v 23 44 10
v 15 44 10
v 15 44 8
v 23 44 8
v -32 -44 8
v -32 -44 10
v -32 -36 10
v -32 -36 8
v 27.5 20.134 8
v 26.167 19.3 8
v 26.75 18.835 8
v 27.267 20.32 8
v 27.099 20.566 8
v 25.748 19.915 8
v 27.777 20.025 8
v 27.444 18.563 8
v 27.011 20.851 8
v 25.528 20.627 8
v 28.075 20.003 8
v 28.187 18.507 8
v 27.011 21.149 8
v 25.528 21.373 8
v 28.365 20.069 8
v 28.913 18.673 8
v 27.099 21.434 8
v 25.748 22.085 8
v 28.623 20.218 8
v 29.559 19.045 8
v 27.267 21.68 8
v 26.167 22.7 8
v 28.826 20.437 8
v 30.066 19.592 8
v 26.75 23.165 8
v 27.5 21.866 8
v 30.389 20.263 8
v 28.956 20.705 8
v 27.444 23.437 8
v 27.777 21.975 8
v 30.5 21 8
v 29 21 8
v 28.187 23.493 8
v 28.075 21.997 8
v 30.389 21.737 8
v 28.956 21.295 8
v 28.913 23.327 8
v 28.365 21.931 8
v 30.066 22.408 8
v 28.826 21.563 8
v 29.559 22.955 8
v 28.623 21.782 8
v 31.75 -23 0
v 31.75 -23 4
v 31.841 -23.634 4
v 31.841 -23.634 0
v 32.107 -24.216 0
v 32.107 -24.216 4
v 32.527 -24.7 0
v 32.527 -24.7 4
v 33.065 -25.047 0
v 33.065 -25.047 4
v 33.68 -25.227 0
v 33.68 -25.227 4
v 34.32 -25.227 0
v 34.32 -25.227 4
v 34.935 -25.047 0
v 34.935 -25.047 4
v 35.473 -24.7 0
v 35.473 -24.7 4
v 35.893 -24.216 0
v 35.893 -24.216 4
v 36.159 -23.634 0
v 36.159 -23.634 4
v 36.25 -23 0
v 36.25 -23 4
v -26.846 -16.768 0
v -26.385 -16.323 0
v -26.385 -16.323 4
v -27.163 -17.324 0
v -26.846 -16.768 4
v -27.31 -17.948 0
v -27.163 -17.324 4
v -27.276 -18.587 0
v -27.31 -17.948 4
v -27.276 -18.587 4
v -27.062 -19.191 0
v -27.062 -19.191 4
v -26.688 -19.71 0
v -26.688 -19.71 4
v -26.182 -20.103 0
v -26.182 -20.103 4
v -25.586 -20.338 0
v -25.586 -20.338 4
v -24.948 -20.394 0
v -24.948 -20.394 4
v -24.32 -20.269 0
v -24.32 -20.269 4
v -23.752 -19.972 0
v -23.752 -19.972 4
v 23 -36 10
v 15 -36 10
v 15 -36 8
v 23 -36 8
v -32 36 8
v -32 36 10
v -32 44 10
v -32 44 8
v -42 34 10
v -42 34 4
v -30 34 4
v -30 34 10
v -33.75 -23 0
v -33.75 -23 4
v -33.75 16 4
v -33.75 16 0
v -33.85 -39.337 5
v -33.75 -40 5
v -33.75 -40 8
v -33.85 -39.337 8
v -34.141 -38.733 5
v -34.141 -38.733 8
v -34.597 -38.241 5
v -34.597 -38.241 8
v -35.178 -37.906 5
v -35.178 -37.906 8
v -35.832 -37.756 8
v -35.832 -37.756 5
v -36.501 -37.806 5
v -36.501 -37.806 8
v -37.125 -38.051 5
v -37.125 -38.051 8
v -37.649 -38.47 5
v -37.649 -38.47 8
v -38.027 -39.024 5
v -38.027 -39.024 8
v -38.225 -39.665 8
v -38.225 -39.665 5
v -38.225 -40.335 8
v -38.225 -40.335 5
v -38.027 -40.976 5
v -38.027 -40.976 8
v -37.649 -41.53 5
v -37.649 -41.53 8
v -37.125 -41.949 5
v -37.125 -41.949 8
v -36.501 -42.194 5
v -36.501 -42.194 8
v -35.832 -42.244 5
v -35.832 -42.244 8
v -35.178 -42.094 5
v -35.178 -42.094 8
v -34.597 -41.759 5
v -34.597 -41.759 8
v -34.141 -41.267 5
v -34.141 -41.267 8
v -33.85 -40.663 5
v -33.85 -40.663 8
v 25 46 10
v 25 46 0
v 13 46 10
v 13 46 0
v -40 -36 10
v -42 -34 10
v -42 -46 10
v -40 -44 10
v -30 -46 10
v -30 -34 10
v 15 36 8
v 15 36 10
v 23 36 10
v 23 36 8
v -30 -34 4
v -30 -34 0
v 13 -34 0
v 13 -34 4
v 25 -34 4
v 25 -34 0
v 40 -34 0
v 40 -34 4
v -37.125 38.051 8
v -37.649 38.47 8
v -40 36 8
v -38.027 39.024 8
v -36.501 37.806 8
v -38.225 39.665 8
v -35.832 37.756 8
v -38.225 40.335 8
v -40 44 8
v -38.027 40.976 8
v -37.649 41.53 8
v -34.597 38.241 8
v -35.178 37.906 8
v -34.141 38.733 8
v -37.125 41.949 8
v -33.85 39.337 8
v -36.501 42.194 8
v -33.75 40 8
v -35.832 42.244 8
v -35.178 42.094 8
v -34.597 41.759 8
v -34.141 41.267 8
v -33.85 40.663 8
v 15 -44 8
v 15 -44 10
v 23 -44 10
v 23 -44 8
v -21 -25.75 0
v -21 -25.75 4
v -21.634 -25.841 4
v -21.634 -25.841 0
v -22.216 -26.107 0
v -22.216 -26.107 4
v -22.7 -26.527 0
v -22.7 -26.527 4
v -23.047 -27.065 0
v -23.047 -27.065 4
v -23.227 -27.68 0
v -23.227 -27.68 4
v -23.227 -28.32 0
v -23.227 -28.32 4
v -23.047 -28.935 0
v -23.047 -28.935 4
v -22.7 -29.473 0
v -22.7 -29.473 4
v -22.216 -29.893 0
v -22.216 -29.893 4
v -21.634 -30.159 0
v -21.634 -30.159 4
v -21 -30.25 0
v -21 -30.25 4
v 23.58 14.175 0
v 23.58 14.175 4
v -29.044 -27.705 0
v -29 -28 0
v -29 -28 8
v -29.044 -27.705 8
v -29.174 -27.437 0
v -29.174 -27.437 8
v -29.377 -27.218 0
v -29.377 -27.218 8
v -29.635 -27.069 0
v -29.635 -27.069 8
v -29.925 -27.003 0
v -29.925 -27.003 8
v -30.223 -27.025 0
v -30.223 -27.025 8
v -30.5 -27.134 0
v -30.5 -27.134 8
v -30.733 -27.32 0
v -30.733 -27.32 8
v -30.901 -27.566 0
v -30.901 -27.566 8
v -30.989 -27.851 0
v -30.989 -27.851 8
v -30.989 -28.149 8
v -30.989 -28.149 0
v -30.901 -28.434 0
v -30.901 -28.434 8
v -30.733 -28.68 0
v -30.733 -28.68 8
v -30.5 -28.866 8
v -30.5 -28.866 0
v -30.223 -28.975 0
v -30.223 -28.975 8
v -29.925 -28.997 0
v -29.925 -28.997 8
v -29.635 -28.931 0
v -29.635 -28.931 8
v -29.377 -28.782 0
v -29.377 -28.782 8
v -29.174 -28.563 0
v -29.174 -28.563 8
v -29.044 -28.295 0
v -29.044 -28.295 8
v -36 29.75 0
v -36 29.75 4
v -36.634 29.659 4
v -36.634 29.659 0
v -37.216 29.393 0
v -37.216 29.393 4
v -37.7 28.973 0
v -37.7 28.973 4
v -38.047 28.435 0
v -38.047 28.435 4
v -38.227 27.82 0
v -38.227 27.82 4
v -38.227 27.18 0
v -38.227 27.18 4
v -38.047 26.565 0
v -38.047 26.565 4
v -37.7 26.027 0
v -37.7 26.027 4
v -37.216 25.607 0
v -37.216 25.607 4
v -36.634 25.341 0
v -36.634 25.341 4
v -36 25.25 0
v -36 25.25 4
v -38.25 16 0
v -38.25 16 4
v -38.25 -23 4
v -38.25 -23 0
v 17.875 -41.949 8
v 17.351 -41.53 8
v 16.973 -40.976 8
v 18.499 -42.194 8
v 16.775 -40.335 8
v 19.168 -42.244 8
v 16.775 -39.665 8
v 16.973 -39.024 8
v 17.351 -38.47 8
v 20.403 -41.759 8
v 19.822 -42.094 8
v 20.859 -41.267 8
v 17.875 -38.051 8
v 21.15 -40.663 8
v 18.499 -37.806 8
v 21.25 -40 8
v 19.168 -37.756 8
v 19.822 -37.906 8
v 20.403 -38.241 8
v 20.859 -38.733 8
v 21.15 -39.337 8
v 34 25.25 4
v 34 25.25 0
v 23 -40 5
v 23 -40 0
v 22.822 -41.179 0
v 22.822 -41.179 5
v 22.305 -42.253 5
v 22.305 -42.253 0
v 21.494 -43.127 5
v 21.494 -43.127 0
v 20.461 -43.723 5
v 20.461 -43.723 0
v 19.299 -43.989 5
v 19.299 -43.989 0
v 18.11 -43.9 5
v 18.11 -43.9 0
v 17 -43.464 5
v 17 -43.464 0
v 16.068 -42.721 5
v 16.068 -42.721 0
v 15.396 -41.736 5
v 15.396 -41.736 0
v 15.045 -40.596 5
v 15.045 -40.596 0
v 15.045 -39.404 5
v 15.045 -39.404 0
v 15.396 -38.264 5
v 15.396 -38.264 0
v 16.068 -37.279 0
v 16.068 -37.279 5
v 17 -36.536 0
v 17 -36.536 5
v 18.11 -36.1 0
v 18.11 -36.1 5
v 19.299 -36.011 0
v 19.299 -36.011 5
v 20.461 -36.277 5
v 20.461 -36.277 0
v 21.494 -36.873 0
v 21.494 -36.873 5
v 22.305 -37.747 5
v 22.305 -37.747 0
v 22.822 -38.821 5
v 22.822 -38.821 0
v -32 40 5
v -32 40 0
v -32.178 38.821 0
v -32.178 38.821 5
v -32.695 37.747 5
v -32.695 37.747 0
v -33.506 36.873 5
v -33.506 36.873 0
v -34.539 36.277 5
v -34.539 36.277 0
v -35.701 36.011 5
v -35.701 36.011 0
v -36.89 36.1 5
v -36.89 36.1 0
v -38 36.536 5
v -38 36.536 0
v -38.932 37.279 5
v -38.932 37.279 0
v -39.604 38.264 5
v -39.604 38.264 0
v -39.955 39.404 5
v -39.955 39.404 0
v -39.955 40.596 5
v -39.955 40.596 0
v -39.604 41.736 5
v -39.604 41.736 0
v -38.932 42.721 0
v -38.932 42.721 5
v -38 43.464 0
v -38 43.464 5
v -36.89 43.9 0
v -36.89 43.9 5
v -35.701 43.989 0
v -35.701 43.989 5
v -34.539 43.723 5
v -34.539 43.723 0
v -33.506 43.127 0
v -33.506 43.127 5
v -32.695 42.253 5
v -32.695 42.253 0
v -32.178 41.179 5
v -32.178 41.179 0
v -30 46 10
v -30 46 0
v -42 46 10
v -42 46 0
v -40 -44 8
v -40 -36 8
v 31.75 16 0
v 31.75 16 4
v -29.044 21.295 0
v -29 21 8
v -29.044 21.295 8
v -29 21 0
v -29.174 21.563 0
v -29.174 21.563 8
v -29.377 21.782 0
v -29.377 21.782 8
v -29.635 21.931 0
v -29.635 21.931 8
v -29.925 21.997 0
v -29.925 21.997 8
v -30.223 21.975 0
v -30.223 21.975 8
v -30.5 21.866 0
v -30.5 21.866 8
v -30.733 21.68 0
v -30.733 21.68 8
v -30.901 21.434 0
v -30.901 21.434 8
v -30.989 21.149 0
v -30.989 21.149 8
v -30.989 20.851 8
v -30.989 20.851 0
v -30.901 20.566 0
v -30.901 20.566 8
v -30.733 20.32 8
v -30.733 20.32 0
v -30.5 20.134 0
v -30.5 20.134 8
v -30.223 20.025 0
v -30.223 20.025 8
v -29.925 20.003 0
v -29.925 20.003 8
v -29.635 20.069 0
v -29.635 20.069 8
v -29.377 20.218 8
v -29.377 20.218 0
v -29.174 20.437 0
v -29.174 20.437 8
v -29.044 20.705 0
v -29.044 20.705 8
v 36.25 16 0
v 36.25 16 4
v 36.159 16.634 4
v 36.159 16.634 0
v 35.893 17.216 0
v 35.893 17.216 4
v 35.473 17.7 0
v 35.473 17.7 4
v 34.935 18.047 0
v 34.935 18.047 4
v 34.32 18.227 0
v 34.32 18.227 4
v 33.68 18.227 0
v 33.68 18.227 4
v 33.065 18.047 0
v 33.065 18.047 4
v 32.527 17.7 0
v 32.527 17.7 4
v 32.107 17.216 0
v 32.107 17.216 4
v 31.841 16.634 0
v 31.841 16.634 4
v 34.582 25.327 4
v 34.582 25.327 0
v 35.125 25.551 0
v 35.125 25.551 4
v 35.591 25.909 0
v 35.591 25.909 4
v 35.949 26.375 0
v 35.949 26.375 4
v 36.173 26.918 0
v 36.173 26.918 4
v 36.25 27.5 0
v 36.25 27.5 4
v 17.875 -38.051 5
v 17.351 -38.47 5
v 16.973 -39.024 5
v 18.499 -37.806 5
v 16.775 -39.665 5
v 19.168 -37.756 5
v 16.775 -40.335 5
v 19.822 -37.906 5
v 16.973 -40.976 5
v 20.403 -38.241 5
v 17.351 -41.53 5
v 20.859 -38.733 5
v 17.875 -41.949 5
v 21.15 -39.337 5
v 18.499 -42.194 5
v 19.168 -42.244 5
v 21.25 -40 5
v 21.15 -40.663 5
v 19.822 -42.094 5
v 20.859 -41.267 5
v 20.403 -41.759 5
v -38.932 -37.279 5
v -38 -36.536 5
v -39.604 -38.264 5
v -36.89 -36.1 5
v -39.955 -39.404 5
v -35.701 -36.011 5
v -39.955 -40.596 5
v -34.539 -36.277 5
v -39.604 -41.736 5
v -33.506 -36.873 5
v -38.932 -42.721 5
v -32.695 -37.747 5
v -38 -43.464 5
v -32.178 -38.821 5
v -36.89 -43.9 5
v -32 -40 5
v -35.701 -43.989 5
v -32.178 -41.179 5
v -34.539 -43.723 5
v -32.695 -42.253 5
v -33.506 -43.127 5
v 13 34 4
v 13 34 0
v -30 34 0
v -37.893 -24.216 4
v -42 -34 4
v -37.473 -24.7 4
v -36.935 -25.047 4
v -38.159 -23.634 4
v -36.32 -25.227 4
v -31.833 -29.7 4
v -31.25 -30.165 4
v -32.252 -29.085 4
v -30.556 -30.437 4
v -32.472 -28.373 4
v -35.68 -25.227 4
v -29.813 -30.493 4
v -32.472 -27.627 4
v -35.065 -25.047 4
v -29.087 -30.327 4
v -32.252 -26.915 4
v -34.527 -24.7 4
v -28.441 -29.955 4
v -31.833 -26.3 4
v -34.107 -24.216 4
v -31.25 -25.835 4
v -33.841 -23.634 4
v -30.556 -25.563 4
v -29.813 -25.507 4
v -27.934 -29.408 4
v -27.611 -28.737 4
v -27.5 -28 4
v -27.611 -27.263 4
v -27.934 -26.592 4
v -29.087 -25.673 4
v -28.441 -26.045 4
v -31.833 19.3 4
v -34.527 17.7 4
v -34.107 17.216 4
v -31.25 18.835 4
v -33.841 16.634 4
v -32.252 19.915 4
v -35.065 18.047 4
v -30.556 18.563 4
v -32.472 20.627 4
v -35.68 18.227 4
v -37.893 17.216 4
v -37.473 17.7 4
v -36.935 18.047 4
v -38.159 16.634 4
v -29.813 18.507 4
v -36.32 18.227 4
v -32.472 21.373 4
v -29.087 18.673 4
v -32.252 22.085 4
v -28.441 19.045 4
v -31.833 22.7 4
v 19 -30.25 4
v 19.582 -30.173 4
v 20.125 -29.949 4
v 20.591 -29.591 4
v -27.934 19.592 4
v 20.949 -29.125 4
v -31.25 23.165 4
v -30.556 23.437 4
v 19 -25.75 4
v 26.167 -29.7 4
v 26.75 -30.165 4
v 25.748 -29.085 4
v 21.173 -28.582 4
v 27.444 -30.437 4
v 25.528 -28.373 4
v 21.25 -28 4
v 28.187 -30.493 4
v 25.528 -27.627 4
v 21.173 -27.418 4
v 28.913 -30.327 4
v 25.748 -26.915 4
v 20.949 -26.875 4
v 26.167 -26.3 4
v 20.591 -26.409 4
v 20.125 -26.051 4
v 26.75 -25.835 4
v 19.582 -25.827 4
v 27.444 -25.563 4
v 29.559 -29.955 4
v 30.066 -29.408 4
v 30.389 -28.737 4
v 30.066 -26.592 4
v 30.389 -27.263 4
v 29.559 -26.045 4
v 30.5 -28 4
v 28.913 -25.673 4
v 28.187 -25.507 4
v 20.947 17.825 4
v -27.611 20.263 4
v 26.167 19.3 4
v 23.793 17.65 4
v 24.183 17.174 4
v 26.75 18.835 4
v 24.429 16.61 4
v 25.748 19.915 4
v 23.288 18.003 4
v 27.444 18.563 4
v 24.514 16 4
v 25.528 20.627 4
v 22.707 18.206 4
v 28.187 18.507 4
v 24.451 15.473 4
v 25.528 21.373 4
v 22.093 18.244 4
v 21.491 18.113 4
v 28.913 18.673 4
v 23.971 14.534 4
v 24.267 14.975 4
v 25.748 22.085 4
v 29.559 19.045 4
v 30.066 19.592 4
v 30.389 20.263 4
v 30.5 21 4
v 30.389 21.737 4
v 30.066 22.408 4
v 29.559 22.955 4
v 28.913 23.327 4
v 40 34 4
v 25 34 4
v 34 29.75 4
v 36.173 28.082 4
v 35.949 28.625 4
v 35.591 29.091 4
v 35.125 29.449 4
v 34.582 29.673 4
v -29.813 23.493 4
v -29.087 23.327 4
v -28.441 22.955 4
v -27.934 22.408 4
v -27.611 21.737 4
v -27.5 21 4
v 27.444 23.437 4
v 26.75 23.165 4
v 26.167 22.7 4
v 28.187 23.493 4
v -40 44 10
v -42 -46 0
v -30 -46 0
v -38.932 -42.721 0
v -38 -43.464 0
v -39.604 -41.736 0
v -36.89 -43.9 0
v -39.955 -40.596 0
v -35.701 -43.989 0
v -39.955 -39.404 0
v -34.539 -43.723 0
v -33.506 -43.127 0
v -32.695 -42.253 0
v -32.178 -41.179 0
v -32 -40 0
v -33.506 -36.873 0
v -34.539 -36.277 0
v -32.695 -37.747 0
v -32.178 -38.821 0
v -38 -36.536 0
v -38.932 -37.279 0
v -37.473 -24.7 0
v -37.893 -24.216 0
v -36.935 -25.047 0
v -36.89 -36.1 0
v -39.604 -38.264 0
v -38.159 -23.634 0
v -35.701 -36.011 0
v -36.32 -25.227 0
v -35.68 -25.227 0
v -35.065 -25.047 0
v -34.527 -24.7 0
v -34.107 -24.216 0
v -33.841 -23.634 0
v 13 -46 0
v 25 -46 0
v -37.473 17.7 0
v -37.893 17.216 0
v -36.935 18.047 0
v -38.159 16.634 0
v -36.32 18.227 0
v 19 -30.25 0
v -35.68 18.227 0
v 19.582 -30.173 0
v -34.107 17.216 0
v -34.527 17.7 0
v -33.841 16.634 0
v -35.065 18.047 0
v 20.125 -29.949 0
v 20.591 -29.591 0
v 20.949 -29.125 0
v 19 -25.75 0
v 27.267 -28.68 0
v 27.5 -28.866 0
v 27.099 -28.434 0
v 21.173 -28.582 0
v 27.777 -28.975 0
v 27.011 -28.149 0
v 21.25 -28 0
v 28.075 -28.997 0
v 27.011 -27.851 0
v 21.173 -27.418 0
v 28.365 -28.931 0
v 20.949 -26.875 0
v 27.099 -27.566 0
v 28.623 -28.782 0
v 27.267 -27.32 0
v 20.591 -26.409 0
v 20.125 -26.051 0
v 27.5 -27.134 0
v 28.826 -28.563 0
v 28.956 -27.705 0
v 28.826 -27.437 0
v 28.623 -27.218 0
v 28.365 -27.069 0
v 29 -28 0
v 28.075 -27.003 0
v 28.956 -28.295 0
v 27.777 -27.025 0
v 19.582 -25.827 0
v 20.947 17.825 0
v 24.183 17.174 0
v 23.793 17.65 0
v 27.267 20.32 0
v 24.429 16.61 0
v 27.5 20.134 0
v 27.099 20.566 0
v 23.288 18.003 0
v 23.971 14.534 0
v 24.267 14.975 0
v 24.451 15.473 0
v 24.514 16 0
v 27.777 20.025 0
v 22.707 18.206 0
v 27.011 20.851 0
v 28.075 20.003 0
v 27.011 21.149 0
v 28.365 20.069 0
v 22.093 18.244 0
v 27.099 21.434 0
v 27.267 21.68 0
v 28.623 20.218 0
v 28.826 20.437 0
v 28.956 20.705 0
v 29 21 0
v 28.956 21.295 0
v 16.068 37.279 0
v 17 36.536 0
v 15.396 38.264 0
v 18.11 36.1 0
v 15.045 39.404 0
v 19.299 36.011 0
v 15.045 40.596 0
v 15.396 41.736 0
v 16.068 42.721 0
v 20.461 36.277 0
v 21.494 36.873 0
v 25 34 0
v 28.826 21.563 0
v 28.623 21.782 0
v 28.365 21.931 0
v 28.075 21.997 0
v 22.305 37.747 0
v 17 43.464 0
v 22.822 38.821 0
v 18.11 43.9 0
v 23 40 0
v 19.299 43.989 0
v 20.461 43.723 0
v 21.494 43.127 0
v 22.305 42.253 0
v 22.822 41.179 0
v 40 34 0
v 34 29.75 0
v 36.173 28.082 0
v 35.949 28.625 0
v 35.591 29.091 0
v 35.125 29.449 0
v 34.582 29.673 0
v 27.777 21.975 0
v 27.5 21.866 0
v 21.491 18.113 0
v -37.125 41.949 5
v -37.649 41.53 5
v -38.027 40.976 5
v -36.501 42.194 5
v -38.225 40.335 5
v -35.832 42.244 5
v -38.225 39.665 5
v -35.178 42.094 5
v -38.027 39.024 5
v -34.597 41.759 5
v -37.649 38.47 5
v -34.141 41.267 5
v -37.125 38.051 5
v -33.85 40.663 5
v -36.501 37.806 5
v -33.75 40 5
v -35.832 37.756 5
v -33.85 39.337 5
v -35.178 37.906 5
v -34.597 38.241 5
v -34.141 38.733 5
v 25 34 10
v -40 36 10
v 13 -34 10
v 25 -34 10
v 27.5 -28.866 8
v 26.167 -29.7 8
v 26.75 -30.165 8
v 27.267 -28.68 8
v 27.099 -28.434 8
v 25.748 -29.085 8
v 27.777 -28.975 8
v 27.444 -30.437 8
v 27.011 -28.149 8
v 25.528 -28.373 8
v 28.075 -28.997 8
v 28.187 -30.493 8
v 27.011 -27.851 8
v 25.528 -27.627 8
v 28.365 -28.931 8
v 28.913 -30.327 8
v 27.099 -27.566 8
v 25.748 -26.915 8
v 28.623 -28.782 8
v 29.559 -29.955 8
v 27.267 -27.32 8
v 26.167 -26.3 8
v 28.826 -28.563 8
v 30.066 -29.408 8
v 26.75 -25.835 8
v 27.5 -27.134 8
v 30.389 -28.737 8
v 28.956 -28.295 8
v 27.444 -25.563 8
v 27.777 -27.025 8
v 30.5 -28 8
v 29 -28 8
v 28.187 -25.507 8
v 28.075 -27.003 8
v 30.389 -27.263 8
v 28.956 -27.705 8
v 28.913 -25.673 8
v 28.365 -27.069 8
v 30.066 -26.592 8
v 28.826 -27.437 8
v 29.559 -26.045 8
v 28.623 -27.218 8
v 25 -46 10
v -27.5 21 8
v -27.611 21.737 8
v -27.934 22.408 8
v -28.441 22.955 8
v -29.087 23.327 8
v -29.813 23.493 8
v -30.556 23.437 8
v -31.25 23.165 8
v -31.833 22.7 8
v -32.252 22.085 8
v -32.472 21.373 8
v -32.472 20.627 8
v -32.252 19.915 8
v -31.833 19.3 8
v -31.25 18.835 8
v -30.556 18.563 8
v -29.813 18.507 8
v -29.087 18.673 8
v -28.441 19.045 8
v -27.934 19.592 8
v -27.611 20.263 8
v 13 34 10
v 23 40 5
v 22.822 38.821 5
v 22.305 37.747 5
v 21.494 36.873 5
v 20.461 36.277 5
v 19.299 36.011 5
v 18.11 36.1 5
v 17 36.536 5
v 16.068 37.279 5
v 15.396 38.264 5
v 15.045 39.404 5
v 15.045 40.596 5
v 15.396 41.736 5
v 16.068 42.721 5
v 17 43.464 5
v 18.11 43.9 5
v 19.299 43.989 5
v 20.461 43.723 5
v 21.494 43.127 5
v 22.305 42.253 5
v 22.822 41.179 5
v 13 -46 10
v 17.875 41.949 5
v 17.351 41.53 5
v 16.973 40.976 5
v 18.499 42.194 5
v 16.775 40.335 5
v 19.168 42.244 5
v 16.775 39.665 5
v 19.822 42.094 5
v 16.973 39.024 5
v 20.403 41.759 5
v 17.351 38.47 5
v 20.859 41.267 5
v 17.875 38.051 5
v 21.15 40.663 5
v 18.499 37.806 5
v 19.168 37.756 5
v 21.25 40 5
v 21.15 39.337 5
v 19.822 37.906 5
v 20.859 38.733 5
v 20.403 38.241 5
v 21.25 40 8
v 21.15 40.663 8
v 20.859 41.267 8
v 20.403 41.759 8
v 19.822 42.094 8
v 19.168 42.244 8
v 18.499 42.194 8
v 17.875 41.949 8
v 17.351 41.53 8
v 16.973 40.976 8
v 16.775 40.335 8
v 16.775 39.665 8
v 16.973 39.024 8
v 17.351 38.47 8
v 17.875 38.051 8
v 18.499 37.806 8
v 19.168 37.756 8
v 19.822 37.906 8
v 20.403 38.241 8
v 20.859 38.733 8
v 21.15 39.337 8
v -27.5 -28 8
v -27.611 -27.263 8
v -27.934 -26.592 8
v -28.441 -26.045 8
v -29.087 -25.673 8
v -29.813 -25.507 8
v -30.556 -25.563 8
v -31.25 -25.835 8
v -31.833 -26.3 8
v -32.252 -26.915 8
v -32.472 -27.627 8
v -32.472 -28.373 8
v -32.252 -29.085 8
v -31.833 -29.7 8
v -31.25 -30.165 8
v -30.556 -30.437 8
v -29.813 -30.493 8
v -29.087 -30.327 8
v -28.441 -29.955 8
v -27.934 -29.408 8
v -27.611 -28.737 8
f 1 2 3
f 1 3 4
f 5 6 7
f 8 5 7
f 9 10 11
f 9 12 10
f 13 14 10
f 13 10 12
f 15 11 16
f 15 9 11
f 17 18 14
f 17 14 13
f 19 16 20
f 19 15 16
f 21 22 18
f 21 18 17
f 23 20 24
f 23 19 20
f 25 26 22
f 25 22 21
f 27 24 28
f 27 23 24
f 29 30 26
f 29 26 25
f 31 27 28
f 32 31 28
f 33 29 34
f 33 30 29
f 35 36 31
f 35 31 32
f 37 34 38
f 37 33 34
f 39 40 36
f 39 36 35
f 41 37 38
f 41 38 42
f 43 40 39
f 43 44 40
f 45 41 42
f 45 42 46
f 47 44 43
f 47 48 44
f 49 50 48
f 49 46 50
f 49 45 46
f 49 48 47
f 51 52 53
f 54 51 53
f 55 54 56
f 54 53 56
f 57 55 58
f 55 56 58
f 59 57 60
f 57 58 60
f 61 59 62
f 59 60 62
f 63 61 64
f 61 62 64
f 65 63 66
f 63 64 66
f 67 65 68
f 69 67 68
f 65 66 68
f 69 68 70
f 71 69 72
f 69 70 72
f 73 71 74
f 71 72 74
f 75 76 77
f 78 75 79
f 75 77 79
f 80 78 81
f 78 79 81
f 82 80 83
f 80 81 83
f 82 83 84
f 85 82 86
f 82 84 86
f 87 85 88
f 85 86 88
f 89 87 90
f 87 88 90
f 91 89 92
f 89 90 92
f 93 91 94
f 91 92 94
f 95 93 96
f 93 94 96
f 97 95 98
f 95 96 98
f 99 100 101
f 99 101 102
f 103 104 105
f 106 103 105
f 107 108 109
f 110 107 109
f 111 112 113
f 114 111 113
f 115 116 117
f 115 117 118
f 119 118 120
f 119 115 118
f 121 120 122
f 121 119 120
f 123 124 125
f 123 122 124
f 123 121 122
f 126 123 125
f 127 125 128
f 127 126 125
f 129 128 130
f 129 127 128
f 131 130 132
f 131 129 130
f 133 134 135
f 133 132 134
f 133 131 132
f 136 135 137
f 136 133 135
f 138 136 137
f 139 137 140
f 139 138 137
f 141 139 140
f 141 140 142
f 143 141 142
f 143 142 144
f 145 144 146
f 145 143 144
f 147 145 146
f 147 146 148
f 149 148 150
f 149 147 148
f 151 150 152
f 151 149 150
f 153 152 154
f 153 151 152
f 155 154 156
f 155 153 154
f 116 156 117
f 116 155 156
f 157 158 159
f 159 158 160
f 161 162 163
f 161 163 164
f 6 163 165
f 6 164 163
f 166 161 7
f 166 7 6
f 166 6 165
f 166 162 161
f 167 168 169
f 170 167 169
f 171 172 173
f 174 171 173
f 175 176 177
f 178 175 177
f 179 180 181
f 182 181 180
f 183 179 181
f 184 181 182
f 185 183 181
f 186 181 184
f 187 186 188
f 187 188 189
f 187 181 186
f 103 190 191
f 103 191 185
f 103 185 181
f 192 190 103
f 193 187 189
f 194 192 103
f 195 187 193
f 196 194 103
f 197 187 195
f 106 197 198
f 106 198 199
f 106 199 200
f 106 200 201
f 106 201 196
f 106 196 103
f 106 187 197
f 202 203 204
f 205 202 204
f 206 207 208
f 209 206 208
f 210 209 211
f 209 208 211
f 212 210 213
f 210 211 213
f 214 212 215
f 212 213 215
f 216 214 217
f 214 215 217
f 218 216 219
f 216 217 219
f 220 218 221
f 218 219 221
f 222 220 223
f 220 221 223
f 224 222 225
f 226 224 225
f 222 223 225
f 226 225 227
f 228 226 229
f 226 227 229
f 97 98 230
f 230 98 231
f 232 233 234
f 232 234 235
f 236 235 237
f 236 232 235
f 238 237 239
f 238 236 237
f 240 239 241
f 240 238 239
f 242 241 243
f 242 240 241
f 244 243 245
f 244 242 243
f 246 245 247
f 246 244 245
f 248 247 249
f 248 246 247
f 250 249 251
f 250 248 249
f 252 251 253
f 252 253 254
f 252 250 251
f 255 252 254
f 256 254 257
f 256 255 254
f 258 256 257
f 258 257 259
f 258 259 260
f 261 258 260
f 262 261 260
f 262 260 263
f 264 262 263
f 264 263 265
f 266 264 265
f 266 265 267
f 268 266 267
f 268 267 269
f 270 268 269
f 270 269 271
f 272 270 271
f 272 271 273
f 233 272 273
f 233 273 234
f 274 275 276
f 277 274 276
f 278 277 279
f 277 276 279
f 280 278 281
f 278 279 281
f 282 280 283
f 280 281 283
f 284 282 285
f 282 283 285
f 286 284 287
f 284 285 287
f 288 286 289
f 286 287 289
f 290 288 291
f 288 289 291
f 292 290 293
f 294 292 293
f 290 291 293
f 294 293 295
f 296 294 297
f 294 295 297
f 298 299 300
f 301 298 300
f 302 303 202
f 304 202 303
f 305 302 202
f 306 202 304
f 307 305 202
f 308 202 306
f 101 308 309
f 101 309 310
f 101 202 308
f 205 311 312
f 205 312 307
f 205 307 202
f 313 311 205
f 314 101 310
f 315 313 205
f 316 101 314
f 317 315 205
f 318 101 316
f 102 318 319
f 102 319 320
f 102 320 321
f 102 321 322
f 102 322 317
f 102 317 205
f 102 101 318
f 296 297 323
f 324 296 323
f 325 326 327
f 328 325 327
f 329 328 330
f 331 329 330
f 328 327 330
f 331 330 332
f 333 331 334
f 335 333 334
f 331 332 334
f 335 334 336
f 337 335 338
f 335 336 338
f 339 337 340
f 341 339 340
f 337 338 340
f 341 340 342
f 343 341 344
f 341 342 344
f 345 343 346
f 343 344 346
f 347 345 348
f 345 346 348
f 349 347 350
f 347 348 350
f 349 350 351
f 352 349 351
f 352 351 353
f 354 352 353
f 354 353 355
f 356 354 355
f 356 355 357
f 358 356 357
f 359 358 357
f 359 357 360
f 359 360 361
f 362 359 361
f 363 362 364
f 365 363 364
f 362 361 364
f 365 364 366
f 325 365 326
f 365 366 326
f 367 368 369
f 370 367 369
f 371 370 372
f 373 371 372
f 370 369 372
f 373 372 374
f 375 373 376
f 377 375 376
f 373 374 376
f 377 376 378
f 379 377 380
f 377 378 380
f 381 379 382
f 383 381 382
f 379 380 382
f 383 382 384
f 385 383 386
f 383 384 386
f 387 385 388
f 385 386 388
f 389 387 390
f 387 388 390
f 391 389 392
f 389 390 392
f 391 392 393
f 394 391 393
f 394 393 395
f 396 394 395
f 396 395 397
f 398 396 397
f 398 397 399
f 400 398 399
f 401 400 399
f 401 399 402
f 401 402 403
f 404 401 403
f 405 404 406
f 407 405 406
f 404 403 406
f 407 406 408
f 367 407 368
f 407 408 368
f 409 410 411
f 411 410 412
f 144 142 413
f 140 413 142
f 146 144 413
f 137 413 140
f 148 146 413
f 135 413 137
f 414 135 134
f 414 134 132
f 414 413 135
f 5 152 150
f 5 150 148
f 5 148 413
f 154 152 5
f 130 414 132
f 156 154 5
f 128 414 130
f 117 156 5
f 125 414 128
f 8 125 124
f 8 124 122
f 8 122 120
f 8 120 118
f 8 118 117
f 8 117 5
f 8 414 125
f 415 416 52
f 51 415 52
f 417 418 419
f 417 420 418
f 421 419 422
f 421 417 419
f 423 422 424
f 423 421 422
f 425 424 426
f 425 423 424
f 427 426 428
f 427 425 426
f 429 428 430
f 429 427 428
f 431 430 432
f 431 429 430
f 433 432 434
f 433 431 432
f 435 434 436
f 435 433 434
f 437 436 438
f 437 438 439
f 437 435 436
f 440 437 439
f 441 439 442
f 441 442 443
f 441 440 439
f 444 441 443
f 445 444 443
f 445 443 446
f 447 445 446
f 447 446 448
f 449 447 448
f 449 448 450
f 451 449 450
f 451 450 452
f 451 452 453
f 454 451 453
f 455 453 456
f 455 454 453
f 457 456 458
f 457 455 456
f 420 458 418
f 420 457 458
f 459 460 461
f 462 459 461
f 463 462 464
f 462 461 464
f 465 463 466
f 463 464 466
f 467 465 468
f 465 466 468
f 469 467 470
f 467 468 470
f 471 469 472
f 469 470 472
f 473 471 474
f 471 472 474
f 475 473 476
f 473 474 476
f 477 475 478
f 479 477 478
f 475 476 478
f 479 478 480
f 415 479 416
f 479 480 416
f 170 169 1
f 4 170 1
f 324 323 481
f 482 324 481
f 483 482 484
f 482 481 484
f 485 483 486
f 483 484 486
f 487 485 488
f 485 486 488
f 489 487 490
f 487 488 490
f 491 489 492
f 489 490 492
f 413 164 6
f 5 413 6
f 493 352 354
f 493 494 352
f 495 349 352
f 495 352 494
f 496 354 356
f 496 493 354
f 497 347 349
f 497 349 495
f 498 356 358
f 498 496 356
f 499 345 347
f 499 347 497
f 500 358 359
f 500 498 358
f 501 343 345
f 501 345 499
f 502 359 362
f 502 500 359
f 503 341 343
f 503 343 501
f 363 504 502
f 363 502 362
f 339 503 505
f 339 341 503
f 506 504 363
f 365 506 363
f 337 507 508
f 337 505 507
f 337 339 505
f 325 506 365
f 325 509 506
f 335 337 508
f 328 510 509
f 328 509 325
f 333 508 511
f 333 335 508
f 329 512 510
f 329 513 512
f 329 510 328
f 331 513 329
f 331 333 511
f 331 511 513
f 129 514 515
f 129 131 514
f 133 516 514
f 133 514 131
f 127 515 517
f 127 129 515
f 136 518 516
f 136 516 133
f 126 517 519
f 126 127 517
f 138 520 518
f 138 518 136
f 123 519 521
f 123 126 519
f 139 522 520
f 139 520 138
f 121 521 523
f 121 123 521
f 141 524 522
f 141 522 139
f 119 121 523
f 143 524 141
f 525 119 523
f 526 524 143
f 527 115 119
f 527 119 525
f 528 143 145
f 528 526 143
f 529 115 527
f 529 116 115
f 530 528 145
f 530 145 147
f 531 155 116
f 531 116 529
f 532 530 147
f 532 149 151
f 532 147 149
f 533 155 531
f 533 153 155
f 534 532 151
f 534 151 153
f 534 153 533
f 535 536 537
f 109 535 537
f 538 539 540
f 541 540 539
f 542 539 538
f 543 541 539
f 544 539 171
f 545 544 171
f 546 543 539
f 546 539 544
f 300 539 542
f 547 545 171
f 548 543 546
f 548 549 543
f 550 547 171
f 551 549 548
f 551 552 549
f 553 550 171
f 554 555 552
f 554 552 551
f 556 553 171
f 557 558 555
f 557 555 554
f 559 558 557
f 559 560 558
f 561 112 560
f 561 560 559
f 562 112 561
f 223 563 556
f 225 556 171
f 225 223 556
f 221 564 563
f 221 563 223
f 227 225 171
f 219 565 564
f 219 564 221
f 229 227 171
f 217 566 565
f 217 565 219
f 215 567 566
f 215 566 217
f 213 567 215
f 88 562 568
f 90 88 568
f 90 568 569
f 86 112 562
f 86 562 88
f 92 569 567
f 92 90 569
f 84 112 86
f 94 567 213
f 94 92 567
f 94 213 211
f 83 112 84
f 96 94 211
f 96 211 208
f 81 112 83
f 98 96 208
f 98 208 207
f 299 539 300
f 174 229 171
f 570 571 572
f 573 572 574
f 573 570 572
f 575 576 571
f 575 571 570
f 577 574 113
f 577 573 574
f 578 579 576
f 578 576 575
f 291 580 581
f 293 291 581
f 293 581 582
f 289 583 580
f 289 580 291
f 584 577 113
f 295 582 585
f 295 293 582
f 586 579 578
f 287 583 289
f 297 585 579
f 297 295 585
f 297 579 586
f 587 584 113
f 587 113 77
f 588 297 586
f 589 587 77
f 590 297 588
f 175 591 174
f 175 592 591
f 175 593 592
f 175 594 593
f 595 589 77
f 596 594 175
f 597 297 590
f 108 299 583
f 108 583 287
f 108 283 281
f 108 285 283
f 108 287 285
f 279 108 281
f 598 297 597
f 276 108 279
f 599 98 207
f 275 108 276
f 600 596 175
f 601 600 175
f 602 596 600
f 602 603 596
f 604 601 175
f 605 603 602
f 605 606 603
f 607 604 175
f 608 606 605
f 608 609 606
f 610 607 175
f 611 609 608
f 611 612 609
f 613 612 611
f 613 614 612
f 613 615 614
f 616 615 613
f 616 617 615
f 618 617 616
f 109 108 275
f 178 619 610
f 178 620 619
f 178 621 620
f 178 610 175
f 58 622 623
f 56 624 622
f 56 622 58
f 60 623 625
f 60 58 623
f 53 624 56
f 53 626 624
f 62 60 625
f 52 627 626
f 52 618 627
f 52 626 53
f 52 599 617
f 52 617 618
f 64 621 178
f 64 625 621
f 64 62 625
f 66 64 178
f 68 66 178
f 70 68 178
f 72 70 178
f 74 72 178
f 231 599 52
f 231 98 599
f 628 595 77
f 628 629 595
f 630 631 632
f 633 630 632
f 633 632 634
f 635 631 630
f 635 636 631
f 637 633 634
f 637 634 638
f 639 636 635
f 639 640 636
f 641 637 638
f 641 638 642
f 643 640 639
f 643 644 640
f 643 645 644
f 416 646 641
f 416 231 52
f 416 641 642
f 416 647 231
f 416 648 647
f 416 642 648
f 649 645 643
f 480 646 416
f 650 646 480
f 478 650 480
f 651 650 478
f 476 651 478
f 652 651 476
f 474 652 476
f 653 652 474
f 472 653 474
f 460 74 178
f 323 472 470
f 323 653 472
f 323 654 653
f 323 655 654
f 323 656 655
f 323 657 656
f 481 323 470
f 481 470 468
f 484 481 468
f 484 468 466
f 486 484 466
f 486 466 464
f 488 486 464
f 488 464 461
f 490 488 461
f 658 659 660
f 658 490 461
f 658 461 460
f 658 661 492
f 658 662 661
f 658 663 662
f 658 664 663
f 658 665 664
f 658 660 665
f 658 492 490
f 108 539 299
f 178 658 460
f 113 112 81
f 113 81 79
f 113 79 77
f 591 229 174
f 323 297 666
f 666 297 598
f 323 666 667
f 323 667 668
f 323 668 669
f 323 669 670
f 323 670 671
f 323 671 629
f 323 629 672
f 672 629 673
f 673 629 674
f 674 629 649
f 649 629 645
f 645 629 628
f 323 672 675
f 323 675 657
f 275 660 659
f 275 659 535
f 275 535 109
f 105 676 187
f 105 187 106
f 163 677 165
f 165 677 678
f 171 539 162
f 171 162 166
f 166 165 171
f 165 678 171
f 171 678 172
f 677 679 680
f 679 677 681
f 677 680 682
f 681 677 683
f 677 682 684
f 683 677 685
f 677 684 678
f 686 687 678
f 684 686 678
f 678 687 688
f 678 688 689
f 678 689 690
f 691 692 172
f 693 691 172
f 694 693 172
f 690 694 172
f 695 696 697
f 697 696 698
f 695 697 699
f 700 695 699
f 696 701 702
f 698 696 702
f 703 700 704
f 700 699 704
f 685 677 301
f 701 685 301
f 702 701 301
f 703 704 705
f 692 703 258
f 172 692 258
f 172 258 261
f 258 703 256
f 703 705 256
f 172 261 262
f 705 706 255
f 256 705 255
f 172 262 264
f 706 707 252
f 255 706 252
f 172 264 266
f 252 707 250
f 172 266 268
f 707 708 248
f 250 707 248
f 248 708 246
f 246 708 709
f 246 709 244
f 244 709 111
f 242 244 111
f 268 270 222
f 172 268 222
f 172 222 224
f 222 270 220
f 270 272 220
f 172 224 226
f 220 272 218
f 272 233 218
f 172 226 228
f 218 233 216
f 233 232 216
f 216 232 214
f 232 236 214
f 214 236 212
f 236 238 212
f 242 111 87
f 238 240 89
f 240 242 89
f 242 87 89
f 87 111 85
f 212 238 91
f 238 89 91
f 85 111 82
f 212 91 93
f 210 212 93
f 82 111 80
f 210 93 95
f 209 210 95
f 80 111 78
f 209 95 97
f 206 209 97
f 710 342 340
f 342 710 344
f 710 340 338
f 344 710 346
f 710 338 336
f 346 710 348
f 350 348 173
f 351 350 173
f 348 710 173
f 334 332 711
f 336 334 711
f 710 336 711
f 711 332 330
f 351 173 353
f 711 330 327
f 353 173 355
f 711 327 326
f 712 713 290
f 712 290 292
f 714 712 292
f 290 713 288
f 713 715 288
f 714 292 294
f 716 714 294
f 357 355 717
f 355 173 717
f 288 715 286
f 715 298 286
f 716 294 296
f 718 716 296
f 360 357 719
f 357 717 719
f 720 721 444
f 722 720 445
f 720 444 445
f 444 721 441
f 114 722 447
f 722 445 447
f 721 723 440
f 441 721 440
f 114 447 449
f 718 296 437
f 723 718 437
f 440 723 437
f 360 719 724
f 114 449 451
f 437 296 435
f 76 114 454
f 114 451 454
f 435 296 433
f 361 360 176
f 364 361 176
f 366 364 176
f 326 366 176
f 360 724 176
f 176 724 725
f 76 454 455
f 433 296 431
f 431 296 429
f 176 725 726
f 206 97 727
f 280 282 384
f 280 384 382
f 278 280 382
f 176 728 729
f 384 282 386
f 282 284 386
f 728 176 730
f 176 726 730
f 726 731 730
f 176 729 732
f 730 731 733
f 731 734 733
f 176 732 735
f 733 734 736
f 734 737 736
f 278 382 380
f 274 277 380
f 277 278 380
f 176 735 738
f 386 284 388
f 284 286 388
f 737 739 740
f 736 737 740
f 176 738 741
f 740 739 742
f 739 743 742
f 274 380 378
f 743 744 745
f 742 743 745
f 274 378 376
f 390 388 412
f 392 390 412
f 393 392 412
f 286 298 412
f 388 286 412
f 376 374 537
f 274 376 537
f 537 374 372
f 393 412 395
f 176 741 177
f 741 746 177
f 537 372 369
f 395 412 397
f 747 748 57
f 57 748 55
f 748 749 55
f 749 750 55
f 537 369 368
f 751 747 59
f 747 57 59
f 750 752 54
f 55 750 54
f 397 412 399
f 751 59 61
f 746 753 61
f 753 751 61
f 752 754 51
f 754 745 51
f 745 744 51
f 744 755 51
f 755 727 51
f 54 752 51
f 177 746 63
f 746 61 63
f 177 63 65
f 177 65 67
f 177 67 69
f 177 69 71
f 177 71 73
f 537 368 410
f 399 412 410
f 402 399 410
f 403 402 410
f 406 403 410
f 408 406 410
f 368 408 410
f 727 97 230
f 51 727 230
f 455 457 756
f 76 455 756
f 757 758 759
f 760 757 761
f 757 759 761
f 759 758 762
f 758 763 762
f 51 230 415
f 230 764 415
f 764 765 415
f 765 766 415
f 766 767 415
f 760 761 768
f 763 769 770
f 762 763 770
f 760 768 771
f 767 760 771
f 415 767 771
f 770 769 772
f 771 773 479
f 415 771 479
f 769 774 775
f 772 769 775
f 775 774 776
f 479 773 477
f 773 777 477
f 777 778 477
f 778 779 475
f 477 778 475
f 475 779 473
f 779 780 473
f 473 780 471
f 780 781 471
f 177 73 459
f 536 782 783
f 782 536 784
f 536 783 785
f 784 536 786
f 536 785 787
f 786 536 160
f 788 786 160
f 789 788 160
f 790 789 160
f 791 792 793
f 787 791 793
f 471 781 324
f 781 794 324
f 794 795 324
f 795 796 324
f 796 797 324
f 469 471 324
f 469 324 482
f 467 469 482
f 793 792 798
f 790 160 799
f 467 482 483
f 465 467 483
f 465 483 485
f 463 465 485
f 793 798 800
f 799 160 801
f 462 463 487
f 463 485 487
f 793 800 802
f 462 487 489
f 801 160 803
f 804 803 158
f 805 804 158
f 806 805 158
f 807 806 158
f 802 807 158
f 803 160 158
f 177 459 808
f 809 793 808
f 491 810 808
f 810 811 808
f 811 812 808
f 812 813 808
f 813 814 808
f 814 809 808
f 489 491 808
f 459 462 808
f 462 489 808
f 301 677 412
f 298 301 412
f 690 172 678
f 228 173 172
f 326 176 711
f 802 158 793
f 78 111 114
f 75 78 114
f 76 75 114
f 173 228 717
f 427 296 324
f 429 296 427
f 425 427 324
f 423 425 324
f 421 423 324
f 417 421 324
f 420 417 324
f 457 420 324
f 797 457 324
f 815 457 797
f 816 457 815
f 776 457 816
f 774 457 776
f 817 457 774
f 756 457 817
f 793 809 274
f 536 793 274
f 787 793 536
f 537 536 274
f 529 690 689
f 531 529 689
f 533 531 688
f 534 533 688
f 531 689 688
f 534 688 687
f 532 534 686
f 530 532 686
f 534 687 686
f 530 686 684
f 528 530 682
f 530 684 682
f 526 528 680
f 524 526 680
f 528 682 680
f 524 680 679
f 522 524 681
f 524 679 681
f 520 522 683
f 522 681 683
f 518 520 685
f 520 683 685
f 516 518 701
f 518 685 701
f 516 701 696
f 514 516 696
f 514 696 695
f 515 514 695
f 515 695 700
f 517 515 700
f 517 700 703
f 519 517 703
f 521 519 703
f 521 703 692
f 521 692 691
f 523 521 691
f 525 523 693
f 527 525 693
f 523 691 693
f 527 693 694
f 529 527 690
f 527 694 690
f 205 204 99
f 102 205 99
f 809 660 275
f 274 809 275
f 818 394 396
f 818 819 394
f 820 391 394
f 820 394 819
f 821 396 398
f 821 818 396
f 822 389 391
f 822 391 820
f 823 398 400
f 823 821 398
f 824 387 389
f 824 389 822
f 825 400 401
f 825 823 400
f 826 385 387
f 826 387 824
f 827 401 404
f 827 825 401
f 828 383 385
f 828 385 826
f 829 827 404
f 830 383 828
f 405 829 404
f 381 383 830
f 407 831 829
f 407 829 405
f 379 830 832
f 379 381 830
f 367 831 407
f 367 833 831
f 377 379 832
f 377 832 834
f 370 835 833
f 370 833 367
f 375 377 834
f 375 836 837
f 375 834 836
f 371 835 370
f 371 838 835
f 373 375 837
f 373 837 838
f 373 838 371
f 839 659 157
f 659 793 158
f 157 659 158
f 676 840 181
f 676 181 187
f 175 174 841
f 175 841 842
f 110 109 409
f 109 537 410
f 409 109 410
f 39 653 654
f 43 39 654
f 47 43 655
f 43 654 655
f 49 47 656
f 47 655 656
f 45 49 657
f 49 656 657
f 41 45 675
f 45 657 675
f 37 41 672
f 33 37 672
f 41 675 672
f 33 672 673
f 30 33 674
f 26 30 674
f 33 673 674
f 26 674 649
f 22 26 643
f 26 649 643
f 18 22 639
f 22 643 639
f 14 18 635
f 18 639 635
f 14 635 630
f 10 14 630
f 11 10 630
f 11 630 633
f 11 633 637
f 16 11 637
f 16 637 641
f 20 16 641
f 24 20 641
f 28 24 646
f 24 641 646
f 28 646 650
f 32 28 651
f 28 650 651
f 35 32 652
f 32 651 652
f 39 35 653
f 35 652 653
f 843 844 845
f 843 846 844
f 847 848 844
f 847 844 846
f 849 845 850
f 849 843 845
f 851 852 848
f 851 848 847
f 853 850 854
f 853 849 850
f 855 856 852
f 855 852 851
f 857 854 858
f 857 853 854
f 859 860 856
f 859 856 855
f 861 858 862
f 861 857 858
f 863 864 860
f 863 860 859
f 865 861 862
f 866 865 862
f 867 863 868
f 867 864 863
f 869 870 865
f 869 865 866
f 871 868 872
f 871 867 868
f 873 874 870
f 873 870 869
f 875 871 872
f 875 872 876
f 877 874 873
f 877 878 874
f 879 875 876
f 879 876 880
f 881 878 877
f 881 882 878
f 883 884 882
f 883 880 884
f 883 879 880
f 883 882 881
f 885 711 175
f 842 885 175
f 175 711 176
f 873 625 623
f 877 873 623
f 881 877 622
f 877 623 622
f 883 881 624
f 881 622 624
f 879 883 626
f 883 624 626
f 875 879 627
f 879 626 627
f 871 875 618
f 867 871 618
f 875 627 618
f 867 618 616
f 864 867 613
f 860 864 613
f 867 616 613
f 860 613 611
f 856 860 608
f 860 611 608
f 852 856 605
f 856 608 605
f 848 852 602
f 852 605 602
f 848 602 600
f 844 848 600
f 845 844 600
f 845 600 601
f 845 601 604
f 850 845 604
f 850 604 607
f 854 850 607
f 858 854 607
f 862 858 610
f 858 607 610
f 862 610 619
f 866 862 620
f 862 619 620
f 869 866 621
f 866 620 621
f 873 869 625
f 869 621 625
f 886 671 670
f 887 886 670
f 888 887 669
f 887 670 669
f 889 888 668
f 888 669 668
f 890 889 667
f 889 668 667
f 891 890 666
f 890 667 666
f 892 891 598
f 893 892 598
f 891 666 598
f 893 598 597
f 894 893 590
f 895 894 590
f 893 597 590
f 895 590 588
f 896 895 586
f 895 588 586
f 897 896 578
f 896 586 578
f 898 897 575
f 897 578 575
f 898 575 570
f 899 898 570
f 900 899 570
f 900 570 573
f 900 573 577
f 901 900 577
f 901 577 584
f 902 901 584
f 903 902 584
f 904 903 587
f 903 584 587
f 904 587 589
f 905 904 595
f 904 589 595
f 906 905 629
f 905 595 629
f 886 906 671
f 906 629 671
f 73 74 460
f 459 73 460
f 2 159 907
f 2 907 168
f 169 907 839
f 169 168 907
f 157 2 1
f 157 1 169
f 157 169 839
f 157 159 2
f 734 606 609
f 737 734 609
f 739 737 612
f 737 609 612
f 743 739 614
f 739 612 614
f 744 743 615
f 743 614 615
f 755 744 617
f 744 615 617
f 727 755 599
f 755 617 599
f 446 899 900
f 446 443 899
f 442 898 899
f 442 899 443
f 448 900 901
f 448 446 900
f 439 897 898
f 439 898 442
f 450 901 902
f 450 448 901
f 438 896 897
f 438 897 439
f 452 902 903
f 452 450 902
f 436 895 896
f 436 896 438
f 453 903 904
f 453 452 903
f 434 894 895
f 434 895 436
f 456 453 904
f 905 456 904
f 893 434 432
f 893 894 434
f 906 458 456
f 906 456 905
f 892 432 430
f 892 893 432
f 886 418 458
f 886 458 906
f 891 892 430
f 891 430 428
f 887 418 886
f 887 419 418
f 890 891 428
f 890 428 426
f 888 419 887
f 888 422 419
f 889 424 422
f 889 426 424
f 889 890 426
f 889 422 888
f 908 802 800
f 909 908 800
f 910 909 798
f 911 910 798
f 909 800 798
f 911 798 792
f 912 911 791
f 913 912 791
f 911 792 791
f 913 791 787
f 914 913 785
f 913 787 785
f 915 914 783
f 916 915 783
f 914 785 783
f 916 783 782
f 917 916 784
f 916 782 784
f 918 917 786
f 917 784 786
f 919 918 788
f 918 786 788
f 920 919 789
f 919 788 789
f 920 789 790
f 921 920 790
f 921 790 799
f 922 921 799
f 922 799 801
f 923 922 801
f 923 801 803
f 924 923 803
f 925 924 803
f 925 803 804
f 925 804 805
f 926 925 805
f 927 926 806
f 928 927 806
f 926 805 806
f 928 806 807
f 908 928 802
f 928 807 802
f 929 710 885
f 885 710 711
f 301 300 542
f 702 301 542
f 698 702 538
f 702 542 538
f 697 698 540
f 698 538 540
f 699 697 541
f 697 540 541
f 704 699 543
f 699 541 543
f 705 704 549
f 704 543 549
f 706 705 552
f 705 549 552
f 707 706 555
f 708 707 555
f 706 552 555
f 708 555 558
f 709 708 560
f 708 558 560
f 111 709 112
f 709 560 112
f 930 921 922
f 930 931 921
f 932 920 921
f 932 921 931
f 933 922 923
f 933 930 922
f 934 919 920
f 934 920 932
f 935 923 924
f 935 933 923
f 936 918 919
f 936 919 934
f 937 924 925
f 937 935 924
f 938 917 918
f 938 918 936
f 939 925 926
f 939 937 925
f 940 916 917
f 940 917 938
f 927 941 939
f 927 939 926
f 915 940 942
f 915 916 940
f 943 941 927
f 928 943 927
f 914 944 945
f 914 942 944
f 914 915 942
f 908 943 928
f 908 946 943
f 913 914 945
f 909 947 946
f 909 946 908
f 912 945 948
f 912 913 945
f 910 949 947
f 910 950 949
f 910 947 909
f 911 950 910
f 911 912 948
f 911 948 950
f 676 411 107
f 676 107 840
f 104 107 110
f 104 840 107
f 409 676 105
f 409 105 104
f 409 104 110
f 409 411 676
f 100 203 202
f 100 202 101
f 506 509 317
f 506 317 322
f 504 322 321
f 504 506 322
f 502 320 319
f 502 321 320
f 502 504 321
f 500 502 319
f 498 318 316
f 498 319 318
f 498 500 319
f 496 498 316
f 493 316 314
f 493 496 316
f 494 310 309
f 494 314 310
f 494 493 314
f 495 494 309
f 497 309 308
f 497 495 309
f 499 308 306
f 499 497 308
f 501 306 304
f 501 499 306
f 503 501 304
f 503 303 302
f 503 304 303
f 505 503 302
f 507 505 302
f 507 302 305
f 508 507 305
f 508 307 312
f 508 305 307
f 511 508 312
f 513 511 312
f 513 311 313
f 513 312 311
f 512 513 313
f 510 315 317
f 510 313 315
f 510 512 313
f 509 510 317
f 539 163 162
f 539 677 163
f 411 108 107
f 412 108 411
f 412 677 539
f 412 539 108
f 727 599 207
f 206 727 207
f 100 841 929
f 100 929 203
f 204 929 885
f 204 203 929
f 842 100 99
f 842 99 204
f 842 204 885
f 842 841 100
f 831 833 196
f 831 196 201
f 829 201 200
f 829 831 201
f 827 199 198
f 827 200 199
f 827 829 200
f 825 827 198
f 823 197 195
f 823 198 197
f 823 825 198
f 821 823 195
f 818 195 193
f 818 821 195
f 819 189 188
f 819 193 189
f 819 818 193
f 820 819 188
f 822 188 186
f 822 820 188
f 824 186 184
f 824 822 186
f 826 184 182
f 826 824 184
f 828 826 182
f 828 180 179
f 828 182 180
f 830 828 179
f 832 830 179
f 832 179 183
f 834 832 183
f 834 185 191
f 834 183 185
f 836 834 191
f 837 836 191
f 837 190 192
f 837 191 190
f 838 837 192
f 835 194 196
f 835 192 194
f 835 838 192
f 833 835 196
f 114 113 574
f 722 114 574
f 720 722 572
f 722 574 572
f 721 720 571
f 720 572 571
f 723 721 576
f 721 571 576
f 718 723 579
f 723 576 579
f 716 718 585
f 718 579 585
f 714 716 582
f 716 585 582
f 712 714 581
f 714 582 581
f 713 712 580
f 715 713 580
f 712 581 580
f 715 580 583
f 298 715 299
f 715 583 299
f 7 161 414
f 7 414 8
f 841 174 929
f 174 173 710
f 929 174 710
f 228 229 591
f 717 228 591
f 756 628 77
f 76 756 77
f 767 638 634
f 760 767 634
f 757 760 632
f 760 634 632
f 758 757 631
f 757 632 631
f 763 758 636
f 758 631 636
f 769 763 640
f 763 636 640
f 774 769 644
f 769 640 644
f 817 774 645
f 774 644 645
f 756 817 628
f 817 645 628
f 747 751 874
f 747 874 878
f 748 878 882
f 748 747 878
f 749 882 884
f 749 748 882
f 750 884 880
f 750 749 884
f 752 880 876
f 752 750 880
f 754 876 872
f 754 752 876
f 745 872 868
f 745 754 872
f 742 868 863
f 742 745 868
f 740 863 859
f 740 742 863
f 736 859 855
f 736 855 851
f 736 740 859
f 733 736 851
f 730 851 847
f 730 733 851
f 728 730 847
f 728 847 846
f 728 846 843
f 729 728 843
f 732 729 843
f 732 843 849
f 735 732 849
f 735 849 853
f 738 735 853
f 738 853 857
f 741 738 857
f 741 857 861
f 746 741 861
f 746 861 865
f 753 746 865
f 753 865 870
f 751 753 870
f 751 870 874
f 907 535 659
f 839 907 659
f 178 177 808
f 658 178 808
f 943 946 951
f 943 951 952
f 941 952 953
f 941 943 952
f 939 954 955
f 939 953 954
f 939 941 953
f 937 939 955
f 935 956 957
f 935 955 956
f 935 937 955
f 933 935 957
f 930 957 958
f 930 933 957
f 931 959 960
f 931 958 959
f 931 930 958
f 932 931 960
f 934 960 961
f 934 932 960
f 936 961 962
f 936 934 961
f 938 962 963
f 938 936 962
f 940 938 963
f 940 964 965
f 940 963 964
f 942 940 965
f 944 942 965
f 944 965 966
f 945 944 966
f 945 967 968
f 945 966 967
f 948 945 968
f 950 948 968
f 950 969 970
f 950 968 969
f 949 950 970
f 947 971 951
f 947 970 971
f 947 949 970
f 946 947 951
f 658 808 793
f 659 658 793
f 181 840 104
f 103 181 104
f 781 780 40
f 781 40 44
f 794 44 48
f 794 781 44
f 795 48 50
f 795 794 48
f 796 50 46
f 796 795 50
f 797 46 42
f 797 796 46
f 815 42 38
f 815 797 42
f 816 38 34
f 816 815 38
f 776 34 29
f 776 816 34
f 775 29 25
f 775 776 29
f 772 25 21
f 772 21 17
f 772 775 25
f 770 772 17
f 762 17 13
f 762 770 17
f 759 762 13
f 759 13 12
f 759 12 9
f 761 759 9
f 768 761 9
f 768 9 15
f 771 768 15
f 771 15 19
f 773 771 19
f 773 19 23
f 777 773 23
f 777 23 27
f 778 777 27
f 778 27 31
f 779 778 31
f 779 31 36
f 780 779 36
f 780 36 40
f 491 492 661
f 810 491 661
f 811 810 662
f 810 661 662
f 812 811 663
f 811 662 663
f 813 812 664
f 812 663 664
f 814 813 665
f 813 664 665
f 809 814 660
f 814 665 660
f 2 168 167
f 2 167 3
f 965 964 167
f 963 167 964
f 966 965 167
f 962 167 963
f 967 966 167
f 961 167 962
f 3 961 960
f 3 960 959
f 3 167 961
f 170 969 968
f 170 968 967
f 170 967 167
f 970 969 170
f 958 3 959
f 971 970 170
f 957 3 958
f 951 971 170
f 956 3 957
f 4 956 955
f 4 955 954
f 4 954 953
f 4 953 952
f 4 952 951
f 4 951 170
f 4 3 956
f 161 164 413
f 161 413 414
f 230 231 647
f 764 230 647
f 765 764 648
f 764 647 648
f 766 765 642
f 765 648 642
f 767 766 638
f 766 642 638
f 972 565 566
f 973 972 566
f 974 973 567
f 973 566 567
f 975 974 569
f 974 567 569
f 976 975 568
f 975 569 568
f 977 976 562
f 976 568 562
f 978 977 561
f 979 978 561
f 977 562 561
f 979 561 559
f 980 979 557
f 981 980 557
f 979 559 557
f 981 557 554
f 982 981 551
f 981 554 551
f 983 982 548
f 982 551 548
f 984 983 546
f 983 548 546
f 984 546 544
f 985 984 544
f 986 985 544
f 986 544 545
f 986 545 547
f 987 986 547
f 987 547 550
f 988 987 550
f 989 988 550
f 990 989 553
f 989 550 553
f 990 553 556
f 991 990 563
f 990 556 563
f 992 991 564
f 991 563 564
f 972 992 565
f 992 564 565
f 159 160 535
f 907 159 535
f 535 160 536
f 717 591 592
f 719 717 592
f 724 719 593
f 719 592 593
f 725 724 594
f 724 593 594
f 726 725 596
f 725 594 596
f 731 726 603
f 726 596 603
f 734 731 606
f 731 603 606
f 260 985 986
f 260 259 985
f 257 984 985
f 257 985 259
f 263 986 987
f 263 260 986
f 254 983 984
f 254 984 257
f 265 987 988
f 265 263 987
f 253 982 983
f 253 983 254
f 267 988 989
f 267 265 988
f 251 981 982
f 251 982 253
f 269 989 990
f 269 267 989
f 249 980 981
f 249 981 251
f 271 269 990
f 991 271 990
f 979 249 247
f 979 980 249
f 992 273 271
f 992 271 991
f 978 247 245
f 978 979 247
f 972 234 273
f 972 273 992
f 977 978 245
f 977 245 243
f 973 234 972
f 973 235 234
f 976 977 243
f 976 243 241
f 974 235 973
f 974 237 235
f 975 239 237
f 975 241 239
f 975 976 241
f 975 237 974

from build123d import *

# Parameters (mm, degrees)
F0_R      = 2.25
F0_R_2    = 1
F1_DEPTH  = 4
F2_W      = 12
F2_H      = 12
F2_R      = 2.25
F3_DEPTH  = 6
F4_W      = 8
F4_H      = 8
F5_DEPTH  = 2
F6_R      = 4
F6_R_2    = 2.25
F7_DEPTH  = 5
F8_R      = 2.5
F8_R_2    = 1
F9_DEPTH  = 4
F11_DEPTH = 4.001


with BuildPart() as f1:
    # F0 (on Top) → F1 (new body)
    with BuildSketch(Plane.XY):
        Polygon((-30, 46), (-42, 46), (-42, -46), (-30, -46), (-30, -34), (13, -34), (13, -46), (25, -46), (25, -34), (40, -34), (40, 34), (25, 34), (25, 46), (13, 46), (13, 34), (-30, 34), align=None)
        with Locations((-36, -40)):
            Circle(F0_R, mode=Mode.SUBTRACT)
        with Locations((-30, -28)):
            Circle(F0_R_2, mode=Mode.SUBTRACT)
        with Locations((19, -40)):
            Circle(F0_R, mode=Mode.SUBTRACT)
        with Locations((28, -28)):
            Circle(F0_R_2, mode=Mode.SUBTRACT)
        with Locations((-30, 21)):
            Circle(F0_R_2, mode=Mode.SUBTRACT)
        with Locations((-36, 40)):
            Circle(F0_R, mode=Mode.SUBTRACT)
        with Locations((28, 21)):
            Circle(F0_R_2, mode=Mode.SUBTRACT)
        with Locations((19, 40)):
            Circle(F0_R, mode=Mode.SUBTRACT)
    extrude(amount=F1_DEPTH)

    # F2 (on face) → F3 (join)
    with BuildSketch(Plane.XY.offset(4)):
        with Locations((-36, -40)):
            Rectangle(F2_W, F2_H)
        with Locations((-36, -40)):
            Circle(F2_R, mode=Mode.SUBTRACT)
        with Locations((-36, 40)):
            Rectangle(F2_W, F2_H)
        with Locations((-36, 40)):
            Circle(F2_R, mode=Mode.SUBTRACT)
        with Locations((19, 40)):
            Rectangle(F2_W, F2_H)
        with Locations((19, 40)):
            Circle(F2_R, mode=Mode.SUBTRACT)
        with Locations((19, -40)):
            Rectangle(F2_W, F2_H)
        with Locations((19, -40)):
            Circle(F2_R, mode=Mode.SUBTRACT)
    extrude(amount=F3_DEPTH)

    # F4 (on face) → F5 (cut)
    with BuildSketch(Plane.XY.offset(10)):
        with Locations((-36, 40)):
            Rectangle(F4_W, F4_H)
        with Locations((19, 40)):
            Rectangle(F4_W, F4_H)
        with Locations((19, -40)):
            Rectangle(F4_W, F4_H)
        with Locations((-36, -40)):
            Rectangle(F4_W, F4_H)
    extrude(amount=-F5_DEPTH, mode=Mode.SUBTRACT)

    # F6 (on face) → F7 (cut)
    with BuildSketch(Plane(origin=(0, 0, 0), x_dir=(1, 0, 0), z_dir=(0, 0, -1))):
        with Locations((-36, 40)):
            Circle(F6_R)
        with Locations((-36, 40)):
            Circle(F6_R_2, mode=Mode.SUBTRACT)
        with Locations((19, 40)):
            Circle(F6_R)
        with Locations((19, 40)):
            Circle(F6_R_2, mode=Mode.SUBTRACT)
        with Locations((19, -40)):
            Circle(F6_R)
        with Locations((19, -40)):
            Circle(F6_R_2, mode=Mode.SUBTRACT)
        with Locations((-36, -40)):
            Circle(F6_R)
        with Locations((-36, -40)):
            Circle(F6_R_2, mode=Mode.SUBTRACT)
    extrude(amount=-F7_DEPTH, mode=Mode.SUBTRACT)

    # F8 (on face) → F9 (join)
    with BuildSketch(Plane.XY.offset(4)):
        with Locations((-30, 21)):
            Circle(F8_R)
        with Locations((-30, 21)):
            Circle(F8_R_2, mode=Mode.SUBTRACT)
        with Locations((-30, -28)):
            Circle(F8_R)
        with Locations((-30, -28)):
            Circle(F8_R_2, mode=Mode.SUBTRACT)
        with Locations((28, -28)):
            Circle(F8_R)
        with Locations((28, -28)):
            Circle(F8_R_2, mode=Mode.SUBTRACT)
        with Locations((28, 21)):
            Circle(F8_R)
        with Locations((28, 21)):
            Circle(F8_R_2, mode=Mode.SUBTRACT)
    extrude(amount=F9_DEPTH)

    # F10 (on face) → F11 (cut, through all)
    with BuildSketch(Plane.XY.offset(4)):
        with BuildLine():
            ThreePointArc((-36, 29.75), (-34.40901, 29.09099), (-33.75, 27.5))
            ThreePointArc((-33.75, 27.5), (-34.40901, 25.90901), (-36, 25.25))
            Line((-36, 25.25), (34, 25.25))
            ThreePointArc((34, 25.25), (31.75, 27.5), (34, 29.75))
            Line((34, 29.75), (-36, 29.75))
        make_face()
        with BuildLine():
            ThreePointArc((-36, 25.25), (-34.40901, 25.90901), (-33.75, 27.5))
            ThreePointArc((-33.75, 27.5), (-34.40901, 29.09099), (-36, 29.75))
            ThreePointArc((-36, 29.75), (-38.25, 27.5), (-36, 25.25))
        make_face()
        with BuildLine():
            ThreePointArc((-38.25, 16), (-36, 13.75), (-33.75, 16))
            ThreePointArc((-33.75, 16), (-36, 18.25), (-38.25, 16))
        make_face()
        with BuildLine():
            Line((-33.75, -23), (-33.75, 16))
            ThreePointArc((-33.75, 16), (-36, 13.75), (-38.25, 16))
            Line((-38.25, 16), (-38.25, -23))
            ThreePointArc((-38.25, -23), (-36, -20.75), (-33.75, -23))
        make_face()
        with BuildLine():
            ThreePointArc((-38.25, -23), (-36, -25.25), (-33.75, -23))
            ThreePointArc((-33.75, -23), (-36, -20.75), (-38.25, -23))
        make_face()
        with BuildLine():
            ThreePointArc((-23.752473, -19.972448), (-23.06584, -19.172576), (-22.818894, -18.147746))
            ThreePointArc((-22.818894, -18.147746), (-24.044064, -16.144693), (-26.385315, -16.323045))
            ThreePointArc((-26.385315, -16.323045), (-26.893596, -19.464167), (-23.752473, -19.972448))
        make_face()
        with BuildLine():
            ThreePointArc((-26.385315, -16.323045), (-24.044064, -16.144693), (-22.818894, -18.147746))
            ThreePointArc((-22.818894, -18.147746), (-23.06584, -19.172576), (-23.752473, -19.972448))
            Line((-23.752473, -19.972448), (23.579985, 14.175298))
            ThreePointArc((23.579985, 14.175298), (20.438863, 14.683579), (20.947143, 17.824702))
            Line((20.947143, 17.824702), (-26.385315, -16.323045))
        make_face()
        with BuildLine():
            ThreePointArc((24.513564, 16), (23.288394, 18.003054), (20.947143, 17.824702))
            ThreePointArc((20.947143, 17.824702), (20.438863, 14.683579), (23.579985, 14.175298))
            ThreePointArc((23.579985, 14.175298), (24.266618, 14.97517), (24.513564, 16))
        make_face()
        with BuildLine():
            ThreePointArc((36.25, 27.5), (35.59099, 29.09099), (34, 29.75))
            ThreePointArc((34, 29.75), (31.75, 27.5), (34, 25.25))
            ThreePointArc((34, 25.25), (35.59099, 25.90901), (36.25, 27.5))
        make_face()
        with BuildLine():
            Line((36.25, -23), (36.25, 16))
            ThreePointArc((36.25, 16), (34, 13.75), (31.75, 16))
            Line((31.75, 16), (31.75, -23))
            ThreePointArc((31.75, -23), (34, -20.75), (36.25, -23))
        make_face()
        with BuildLine():
            ThreePointArc((31.75, 16), (34, 13.75), (36.25, 16))
            ThreePointArc((36.25, 16), (34, 18.25), (31.75, 16))
        make_face()
        with BuildLine():
            ThreePointArc((31.75, -23), (34, -25.25), (36.25, -23))
            ThreePointArc((36.25, -23), (34, -20.75), (31.75, -23))
        make_face()
        with BuildLine():
            ThreePointArc((21.25, -28), (20.59099, -26.40901), (19, -25.75))
            ThreePointArc((19, -25.75), (16.75, -28), (19, -30.25))
            ThreePointArc((19, -30.25), (20.59099, -29.59099), (21.25, -28))
        make_face()
        with BuildLine():
            ThreePointArc((-21, -25.75), (-19.40901, -26.40901), (-18.75, -28))
            ThreePointArc((-18.75, -28), (-19.40901, -29.59099), (-21, -30.25))
            Line((-21, -30.25), (19, -30.25))
            ThreePointArc((19, -30.25), (16.75, -28), (19, -25.75))
            Line((19, -25.75), (-21, -25.75))
        make_face()
        with BuildLine():
            ThreePointArc((-21, -30.25), (-19.40901, -29.59099), (-18.75, -28))
            ThreePointArc((-18.75, -28), (-19.40901, -26.40901), (-21, -25.75))
            ThreePointArc((-21, -25.75), (-23.25, -28), (-21, -30.25))
        make_face()
    extrude(amount=-F11_DEPTH, mode=Mode.SUBTRACT)


solid = f1.part
